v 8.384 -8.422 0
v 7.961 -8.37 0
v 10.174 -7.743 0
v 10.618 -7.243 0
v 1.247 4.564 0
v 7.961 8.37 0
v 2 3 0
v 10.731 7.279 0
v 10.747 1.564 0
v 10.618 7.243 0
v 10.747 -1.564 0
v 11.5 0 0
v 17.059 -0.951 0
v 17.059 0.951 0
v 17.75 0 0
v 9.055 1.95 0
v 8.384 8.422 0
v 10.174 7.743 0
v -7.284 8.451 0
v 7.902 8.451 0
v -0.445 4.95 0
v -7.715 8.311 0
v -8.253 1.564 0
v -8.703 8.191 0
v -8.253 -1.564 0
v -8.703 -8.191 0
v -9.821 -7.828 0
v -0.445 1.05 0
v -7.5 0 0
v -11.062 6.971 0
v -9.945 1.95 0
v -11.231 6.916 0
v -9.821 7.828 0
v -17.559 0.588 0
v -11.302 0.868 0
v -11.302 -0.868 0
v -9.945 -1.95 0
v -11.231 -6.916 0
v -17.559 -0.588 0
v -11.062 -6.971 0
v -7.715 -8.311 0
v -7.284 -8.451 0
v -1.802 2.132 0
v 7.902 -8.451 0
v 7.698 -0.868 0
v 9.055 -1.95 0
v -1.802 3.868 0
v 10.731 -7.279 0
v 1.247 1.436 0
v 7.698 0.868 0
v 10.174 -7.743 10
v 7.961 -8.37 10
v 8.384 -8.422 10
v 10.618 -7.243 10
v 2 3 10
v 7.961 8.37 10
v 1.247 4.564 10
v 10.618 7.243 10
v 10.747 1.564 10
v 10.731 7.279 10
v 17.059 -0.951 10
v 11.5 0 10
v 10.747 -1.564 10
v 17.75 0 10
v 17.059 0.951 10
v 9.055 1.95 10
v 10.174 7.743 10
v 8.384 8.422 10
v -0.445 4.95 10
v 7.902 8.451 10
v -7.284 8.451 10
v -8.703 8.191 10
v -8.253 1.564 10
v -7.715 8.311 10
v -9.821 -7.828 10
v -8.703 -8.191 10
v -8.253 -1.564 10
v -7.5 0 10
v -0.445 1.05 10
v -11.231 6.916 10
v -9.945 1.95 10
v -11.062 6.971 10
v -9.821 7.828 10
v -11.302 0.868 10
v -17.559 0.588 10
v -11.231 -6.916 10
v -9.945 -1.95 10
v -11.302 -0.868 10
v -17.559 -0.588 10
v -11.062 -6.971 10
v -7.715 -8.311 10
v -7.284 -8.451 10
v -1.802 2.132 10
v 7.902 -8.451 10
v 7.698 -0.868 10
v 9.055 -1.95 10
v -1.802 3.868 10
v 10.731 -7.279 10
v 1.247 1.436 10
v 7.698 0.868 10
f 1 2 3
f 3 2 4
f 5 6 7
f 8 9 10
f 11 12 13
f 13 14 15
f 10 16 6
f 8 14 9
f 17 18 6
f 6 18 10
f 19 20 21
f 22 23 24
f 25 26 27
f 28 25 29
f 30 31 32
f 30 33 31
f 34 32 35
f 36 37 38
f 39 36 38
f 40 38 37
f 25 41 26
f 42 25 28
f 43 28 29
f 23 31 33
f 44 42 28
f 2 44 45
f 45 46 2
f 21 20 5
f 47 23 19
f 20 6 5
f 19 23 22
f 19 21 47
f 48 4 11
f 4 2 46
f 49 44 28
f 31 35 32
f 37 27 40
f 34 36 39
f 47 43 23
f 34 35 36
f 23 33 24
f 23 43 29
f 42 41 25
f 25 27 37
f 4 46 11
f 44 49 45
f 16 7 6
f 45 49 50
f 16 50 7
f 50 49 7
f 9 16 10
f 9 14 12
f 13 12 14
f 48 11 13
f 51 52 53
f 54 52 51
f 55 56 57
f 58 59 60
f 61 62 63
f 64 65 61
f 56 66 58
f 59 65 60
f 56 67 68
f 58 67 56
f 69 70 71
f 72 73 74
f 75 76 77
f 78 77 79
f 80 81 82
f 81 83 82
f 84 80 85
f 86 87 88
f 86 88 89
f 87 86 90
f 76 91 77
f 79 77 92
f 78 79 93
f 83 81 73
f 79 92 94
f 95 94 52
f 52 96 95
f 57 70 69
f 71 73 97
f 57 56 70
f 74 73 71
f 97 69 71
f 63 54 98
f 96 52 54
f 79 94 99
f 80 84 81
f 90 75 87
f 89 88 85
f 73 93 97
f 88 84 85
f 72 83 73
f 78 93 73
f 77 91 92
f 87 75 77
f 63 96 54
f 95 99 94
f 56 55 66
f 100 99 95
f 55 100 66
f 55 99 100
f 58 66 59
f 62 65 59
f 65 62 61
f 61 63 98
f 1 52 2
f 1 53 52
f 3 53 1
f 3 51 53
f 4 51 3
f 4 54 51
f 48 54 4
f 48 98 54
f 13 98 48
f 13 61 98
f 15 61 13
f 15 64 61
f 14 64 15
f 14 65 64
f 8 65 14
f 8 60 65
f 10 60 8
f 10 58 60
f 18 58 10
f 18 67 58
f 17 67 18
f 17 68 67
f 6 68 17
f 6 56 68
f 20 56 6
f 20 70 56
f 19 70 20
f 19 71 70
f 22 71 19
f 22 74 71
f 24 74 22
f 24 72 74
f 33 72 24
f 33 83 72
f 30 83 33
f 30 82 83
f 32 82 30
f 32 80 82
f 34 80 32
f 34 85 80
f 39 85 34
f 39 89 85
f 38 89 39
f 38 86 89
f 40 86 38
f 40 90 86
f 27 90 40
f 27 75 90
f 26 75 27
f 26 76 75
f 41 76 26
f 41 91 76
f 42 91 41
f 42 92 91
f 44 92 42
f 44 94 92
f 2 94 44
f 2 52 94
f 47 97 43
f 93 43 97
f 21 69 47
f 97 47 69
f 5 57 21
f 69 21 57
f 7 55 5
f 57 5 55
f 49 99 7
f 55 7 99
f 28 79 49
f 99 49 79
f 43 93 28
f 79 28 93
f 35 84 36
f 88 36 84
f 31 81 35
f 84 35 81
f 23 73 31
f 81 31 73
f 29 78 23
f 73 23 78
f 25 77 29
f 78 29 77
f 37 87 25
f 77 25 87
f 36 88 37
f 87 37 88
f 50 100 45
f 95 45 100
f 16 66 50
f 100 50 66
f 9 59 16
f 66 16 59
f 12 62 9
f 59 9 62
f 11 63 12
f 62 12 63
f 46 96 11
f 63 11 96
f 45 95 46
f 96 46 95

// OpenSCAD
/*
*Author: Eduardo Foltran
*Desing by Eduardo Foltran
*Date: 2020-12-29
*License: Creative Commons CC-BY (Attribution)
*Thingiverse: https://www.thingiverse.com/thing:4701547
*Visit my portifolio at
*https://www.thingiverse.com/EduardoFoltran/designs

This library can generate any plug derived from the IEC 60906 standard by just fitting 
the appropriated dimensions. The default dimensions are those from the Brazilian NBR14136
standard. The use is more or less self explanatory.

      +------------Width----------+   
      |  _______________________  | _______+
      | /                       \ |        |
       /                         \         |
      <     O               O     >      Height
       \            G            /         |
        \_______________________/   _______+    



*/

module PlugNBR14136(Width = 35.5, Height = 17.0, OtoO = 19.0, 
        OtoG = 3.0, IncludeGround = true, RadiusSmall = 1.0, 
        RadiusLarge = 5.0, PinDiameter = 4.0, PlugHeigth = 10.0){

    Cos45 = cos(45);
    ReducedWith = Width - 2 * RadiusSmall;
    RedudedHeigth = Height - 2 * RadiusSmall;
    ReducedDiagonal = ReducedWith * Cos45;
    ReducedRadius = RadiusLarge - RadiusSmall;
    Diagonal = ReducedDiagonal + 2 * RadiusSmall;

    //$fa =  $preview ? $fa : 1;
    //$fs =  $preview ? $fs : .2;

    DiagonalSmallSquare = RedudedHeigth - 2 * ReducedRadius * (1 - Cos45);
    SideSmallSquare = DiagonalSmallSquare * Cos45;
    CentralRectangleWidth = ReducedWith - DiagonalSmallSquare - 2 * (ReducedRadius * Cos45);

    linear_extrude(height=PlugHeigth, convexity = 20){
        difference(){
            minkowski() {
                union(){
                    //Central Rectangle
                    square([CentralRectangleWidth,RedudedHeigth], center = true);
                    //Two small squares
                    rotate([0,0,-45]) {
                            for (i = [-1, 1]){
                            translate([i, i] * (ReducedDiagonal - SideSmallSquare) / 2) {
                                square(SideSmallSquare, center = true);
                            }
                        }
                    }
                    //Four circles of radius ReducedRadius
                    for (i = [-1, 1] * (RedudedHeigth / 2 - ReducedRadius)){
                        for (j = [-1, 1] * CentralRectangleWidth / 2){
                            translate([j, i])
                                circle(r = ReducedRadius);
                        }
                    }
                }
                circle(r = RadiusSmall);
            }
            for (i = [-1, 1] * OtoO / 2){
                translate([i,0])
                    circle(d = PinDiameter);
            }
            if (IncludeGround) {
                translate([0, OtoG])
                    circle(d = PinDiameter);
            }
        }
    }
}

PlugNBR14136();
